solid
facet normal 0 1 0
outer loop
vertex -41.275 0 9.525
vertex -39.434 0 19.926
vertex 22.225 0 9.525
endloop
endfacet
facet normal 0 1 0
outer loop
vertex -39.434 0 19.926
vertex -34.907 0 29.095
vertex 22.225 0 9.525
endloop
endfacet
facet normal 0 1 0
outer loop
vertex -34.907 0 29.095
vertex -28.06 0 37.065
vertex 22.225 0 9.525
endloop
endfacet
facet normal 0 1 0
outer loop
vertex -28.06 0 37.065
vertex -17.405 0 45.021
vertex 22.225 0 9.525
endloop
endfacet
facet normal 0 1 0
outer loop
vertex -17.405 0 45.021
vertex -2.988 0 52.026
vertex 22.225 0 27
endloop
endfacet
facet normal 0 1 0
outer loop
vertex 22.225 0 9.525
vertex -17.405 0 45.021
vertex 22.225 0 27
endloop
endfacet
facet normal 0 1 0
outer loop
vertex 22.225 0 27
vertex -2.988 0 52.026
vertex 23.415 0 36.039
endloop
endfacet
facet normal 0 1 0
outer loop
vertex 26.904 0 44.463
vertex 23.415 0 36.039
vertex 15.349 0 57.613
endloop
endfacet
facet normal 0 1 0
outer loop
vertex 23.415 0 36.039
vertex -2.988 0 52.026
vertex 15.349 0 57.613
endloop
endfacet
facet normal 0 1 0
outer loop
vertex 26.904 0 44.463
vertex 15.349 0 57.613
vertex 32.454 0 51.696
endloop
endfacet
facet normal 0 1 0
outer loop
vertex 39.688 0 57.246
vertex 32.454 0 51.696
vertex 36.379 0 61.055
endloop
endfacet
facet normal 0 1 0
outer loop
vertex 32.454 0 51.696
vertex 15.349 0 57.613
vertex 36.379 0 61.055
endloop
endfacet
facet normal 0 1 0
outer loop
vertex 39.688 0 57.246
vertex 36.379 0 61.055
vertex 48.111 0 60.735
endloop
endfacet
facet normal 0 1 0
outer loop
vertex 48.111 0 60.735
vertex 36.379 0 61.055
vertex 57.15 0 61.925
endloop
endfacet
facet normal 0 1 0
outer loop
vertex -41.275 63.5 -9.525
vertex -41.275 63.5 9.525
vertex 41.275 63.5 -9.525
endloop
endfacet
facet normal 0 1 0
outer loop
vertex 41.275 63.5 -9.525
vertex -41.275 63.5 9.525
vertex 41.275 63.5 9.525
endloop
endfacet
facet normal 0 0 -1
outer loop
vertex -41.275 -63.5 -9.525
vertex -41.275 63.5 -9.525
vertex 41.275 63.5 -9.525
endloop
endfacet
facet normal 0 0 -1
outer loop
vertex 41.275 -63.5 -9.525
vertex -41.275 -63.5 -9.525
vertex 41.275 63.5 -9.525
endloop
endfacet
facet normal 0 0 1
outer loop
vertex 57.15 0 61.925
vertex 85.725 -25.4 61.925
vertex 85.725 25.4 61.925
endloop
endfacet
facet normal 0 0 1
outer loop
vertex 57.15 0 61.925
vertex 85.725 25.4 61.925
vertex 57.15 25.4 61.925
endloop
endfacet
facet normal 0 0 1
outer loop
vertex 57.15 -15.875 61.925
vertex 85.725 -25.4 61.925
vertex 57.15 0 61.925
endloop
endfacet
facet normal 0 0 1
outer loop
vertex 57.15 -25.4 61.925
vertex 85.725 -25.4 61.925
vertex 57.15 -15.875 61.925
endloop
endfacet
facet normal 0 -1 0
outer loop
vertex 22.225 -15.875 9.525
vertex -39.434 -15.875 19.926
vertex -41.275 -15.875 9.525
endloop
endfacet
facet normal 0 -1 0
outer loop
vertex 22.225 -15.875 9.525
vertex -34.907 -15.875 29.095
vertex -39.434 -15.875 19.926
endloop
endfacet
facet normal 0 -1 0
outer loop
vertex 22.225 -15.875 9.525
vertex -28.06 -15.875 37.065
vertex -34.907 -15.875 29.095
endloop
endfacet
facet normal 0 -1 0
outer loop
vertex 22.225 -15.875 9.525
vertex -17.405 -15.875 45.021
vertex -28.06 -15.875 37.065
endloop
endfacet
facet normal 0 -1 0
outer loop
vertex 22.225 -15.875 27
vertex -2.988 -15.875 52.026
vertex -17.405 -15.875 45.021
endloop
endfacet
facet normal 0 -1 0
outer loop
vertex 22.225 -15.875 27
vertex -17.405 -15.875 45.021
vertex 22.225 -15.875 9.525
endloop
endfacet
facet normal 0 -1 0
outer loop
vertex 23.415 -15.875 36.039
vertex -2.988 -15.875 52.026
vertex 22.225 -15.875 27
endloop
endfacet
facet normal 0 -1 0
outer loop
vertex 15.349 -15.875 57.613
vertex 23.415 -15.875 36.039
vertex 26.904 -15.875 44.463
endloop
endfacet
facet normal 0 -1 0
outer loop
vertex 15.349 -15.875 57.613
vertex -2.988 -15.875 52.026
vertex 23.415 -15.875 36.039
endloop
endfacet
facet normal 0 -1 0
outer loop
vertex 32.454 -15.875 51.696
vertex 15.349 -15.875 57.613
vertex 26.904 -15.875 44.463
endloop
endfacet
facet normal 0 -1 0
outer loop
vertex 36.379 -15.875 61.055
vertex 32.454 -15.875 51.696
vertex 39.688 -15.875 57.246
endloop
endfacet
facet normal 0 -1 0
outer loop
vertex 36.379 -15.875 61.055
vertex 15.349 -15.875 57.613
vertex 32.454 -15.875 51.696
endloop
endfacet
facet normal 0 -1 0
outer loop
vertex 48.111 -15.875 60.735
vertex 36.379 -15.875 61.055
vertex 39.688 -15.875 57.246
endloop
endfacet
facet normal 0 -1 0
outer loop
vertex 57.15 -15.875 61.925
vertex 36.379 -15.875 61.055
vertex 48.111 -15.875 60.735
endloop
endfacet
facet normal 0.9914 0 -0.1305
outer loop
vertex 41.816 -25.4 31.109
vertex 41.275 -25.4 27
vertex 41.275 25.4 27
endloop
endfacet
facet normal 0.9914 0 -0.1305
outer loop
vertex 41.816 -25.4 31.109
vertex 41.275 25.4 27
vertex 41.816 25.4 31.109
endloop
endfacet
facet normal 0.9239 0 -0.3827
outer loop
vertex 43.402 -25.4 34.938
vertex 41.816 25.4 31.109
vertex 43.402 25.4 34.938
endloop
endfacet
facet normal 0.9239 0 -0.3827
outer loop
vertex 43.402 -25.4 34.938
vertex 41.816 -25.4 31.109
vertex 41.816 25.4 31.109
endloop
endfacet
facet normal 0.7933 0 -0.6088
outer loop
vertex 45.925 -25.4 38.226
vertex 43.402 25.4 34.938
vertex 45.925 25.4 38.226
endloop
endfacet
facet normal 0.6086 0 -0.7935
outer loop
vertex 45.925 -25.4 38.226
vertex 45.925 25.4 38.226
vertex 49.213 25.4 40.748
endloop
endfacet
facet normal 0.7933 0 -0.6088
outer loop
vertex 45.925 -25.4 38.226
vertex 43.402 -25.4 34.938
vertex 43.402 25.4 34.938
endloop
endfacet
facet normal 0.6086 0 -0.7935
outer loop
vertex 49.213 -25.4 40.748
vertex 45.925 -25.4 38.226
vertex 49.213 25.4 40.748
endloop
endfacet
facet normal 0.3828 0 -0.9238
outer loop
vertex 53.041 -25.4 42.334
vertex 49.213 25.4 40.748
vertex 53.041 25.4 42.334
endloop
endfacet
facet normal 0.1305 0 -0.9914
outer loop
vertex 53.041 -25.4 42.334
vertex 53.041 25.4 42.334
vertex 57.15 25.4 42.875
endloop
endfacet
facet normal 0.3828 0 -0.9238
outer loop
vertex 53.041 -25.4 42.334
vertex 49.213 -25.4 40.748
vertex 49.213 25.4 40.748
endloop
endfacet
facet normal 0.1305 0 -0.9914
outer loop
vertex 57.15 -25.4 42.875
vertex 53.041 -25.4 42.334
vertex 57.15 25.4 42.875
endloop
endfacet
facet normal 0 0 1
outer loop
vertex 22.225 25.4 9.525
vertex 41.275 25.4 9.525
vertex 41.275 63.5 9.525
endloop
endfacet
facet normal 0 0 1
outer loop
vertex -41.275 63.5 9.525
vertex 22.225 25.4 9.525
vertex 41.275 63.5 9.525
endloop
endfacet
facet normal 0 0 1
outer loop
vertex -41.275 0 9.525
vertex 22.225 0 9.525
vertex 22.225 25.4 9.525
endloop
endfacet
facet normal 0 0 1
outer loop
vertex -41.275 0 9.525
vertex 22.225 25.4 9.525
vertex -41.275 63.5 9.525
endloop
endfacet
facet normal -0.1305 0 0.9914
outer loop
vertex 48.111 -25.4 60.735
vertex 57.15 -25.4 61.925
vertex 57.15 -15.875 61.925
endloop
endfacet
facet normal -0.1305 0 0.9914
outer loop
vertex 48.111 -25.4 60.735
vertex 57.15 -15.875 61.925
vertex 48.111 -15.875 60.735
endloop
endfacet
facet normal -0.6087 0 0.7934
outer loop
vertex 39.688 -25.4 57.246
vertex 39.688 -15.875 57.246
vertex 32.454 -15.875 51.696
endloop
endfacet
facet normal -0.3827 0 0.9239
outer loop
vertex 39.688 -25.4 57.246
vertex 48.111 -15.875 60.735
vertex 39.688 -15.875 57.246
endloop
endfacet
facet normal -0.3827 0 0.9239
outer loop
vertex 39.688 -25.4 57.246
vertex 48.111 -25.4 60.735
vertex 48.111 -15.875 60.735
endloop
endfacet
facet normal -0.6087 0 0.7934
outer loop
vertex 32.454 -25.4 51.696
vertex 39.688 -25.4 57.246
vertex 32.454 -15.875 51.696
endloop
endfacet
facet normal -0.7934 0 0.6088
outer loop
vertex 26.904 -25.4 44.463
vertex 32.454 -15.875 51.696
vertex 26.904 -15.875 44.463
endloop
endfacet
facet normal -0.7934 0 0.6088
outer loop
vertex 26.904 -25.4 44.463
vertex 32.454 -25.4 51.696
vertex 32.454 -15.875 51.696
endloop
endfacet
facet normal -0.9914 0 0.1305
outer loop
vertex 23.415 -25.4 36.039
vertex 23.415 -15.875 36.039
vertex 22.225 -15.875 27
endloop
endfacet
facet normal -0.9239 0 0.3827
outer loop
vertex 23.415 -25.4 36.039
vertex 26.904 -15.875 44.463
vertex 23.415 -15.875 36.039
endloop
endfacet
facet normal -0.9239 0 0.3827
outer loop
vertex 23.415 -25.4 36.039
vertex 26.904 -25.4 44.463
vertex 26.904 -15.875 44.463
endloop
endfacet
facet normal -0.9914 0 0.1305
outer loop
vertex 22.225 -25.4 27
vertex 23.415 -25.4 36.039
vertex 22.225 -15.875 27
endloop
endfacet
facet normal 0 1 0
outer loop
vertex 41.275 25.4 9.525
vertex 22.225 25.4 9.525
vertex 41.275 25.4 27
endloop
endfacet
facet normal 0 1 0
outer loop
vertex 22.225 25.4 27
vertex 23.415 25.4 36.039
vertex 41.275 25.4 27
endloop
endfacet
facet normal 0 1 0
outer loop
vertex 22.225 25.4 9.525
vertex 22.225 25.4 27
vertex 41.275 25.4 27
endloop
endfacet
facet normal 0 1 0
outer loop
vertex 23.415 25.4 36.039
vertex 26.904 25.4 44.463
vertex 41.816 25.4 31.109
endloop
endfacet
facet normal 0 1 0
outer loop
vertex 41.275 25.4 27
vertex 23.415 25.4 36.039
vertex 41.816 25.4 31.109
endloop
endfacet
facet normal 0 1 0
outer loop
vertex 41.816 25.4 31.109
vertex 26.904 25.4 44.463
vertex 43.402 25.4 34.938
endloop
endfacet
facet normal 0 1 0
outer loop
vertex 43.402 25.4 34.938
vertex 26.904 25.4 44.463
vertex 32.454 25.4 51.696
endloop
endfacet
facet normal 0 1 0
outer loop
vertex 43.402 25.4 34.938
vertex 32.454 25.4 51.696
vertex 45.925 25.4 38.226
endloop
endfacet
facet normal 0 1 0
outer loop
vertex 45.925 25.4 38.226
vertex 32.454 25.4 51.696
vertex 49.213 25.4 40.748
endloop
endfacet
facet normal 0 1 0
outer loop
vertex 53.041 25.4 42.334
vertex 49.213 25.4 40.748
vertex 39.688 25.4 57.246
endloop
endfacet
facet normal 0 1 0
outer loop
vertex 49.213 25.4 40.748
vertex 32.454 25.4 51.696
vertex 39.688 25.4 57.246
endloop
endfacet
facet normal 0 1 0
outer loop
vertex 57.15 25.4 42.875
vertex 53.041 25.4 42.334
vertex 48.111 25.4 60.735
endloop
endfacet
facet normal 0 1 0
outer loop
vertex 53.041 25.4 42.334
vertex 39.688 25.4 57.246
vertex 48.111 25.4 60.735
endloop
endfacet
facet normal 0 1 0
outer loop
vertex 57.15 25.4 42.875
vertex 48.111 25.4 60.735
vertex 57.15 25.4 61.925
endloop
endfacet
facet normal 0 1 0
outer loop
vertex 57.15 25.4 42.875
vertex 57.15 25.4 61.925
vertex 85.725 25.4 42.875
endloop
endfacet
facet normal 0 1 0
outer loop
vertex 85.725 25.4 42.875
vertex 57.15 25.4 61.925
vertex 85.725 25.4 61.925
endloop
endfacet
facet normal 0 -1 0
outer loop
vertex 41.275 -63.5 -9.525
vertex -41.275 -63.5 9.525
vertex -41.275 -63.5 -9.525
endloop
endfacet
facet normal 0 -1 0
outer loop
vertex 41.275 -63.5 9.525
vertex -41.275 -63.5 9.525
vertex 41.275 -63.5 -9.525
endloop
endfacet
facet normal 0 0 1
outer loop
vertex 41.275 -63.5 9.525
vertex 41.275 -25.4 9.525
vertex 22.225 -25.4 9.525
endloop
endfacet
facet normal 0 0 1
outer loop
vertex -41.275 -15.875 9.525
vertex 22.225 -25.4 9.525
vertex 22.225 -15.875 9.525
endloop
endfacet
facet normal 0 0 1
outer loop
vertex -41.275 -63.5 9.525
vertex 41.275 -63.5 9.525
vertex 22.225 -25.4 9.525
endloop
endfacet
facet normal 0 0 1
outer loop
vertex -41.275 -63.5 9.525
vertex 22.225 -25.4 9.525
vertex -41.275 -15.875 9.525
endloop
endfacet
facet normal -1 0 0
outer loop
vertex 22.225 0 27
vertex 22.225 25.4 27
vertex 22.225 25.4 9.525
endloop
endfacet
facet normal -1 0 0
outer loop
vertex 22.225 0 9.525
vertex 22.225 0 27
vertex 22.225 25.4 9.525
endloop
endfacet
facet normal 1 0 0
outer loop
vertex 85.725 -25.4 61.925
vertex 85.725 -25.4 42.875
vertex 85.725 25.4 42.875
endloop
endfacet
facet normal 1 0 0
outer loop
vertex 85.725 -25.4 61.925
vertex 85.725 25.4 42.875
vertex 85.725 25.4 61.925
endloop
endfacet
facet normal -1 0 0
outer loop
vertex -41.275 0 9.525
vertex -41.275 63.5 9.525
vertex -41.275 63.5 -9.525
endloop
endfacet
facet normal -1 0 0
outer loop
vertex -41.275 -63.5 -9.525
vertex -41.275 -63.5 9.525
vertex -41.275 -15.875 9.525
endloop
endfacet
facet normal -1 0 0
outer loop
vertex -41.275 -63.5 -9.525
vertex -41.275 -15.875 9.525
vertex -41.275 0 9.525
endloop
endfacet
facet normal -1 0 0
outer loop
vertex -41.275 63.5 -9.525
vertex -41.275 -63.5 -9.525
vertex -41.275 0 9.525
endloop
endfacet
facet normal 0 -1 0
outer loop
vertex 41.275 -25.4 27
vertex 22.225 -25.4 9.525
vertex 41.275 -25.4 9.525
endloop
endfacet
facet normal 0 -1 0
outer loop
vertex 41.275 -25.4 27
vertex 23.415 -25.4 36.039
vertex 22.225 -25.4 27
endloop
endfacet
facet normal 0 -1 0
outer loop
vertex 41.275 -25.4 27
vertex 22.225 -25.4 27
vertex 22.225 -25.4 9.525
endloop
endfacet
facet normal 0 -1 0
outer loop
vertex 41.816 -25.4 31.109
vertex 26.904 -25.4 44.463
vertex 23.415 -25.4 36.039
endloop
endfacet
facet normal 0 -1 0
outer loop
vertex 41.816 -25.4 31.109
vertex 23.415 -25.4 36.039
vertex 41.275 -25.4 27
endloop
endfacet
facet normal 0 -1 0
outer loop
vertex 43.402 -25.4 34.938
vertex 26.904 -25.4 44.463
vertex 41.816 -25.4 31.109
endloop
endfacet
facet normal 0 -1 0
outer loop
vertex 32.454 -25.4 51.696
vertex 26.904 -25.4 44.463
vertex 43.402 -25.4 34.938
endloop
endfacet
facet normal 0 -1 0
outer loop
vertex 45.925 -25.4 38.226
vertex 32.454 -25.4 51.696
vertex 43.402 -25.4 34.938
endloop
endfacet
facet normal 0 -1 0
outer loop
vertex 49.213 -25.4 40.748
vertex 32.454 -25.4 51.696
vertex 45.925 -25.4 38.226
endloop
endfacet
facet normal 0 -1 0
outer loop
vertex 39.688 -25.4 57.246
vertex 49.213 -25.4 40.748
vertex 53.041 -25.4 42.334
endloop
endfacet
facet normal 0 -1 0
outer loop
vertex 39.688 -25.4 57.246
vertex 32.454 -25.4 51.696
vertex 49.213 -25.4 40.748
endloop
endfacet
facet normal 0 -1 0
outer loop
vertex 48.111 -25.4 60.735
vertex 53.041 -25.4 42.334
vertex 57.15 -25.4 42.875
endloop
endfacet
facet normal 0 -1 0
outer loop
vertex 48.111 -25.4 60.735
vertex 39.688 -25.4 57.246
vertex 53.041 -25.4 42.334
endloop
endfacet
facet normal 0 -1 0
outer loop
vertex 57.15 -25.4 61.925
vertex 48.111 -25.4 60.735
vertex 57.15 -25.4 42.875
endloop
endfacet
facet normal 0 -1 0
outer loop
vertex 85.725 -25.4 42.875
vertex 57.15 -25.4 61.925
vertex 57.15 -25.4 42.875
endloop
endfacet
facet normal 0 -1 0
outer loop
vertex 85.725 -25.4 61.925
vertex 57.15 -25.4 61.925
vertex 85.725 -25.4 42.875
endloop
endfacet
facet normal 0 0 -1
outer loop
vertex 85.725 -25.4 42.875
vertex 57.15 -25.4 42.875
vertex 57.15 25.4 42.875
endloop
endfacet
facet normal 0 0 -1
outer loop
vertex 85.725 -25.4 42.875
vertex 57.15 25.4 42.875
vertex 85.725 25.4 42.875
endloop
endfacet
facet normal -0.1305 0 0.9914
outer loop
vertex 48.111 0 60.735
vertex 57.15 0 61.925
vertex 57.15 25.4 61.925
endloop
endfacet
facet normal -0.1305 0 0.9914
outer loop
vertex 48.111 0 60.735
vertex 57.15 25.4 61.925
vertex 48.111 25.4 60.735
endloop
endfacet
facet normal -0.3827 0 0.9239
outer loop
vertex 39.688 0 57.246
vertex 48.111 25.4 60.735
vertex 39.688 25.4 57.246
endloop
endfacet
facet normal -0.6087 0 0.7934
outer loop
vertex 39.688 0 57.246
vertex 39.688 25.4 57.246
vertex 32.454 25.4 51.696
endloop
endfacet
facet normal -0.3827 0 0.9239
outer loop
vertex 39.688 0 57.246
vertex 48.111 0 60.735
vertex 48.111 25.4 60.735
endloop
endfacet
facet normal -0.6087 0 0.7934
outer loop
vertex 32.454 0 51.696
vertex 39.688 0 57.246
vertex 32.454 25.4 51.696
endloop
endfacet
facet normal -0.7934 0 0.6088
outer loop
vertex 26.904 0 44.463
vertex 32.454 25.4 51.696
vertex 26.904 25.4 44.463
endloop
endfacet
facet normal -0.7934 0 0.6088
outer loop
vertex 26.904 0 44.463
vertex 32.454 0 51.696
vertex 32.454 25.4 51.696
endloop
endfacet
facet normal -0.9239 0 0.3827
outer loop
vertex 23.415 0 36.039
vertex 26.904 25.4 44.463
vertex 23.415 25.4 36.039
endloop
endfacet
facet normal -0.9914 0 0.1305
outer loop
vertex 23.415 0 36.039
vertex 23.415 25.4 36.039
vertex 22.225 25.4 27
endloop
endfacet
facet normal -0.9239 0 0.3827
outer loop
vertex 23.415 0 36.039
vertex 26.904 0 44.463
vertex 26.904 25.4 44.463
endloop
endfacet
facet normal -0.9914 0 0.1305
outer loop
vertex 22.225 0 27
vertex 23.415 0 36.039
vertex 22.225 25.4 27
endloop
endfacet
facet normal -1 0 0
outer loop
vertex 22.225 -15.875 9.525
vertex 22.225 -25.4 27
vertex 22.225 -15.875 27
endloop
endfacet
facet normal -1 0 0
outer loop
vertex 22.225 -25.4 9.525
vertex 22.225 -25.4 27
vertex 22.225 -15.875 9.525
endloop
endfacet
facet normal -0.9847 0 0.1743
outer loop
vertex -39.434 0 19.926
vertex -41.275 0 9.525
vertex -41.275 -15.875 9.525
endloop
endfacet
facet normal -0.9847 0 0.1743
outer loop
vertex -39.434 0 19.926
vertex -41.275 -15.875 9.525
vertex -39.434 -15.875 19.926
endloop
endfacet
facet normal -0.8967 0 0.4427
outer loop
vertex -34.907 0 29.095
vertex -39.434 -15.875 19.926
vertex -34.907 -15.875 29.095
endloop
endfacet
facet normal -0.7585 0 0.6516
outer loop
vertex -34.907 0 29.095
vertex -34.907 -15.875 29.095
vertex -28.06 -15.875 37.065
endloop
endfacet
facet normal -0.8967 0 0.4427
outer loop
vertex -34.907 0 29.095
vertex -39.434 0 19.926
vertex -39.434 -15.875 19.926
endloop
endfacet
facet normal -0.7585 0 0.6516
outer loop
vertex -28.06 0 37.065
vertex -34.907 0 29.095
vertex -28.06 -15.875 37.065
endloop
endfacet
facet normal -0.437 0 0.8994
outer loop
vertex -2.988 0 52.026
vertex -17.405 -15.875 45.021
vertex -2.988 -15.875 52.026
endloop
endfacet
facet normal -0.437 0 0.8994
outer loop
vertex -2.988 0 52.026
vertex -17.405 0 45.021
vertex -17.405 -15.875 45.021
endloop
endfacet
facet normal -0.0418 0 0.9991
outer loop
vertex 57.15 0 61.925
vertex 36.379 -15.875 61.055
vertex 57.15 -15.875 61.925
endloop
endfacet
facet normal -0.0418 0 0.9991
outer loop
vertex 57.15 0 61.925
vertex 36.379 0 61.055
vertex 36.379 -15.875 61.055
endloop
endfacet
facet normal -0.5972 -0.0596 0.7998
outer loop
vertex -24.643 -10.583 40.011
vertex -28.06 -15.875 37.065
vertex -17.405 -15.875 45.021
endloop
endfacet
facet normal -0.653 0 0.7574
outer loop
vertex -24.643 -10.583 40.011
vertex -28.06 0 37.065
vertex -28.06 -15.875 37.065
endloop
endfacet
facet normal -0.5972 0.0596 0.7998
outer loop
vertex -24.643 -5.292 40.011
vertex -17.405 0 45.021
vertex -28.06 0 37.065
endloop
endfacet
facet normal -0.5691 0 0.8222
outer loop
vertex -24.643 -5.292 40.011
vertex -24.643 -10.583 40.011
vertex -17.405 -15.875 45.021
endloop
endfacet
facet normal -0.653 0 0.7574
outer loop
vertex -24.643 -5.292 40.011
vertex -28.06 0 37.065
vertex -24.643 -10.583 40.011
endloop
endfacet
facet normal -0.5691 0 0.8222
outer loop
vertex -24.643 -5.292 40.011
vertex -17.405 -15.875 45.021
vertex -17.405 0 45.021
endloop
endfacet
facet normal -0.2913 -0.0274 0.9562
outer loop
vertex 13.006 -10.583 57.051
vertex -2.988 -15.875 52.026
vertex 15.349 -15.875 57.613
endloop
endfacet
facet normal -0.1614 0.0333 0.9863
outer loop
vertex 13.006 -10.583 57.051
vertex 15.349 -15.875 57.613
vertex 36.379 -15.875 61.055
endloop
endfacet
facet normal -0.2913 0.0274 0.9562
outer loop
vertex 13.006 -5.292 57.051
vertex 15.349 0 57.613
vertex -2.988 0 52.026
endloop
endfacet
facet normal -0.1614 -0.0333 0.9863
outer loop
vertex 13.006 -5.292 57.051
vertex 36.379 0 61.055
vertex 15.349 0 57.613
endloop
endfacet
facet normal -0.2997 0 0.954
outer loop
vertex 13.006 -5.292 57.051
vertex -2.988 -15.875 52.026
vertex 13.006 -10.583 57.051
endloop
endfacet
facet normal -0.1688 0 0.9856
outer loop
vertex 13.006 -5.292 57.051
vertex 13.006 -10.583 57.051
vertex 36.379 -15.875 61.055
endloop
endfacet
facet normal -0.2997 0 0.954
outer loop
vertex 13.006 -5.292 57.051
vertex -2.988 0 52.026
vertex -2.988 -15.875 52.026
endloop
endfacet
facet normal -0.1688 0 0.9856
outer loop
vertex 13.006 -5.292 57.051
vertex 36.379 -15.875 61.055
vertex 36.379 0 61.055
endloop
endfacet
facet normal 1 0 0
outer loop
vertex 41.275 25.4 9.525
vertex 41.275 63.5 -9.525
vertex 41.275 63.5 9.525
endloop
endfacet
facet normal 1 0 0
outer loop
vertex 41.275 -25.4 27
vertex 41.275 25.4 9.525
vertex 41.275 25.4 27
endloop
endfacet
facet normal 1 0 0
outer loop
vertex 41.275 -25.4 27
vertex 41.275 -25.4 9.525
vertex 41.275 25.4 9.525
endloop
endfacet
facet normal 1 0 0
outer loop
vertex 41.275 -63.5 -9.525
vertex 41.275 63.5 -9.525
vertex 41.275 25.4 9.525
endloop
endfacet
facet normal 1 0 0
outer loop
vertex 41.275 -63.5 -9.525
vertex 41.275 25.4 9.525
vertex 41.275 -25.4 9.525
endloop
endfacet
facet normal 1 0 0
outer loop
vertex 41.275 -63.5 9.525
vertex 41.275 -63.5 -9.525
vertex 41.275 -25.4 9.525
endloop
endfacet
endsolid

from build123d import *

# Parameters (mm, degrees)
F1_DEPTH = 63.5
F0_W     = 25.4
F0_H     = 19.05
F2_DEPTH = 25.4
F3_DEPTH = 15.875


with BuildPart() as f1:
    # F0 (on Front) → F1 (new body, symmetric)
    with BuildSketch(Plane.XZ):
        Polygon((41.275, -9.525), (41.275, 9.525), (22.225, 9.525), (-41.275, 9.525), (-41.275, -9.525), align=None)
    extrude(amount=F1_DEPTH, both=True)

    # F0 (on Front) → F2 (join, symmetric)
    with BuildSketch(Plane.XZ):
        with BuildLine():
            Line((22.225, 9.525), (41.275, 9.525))
            Line((41.275, 9.525), (41.275, 27.0002))
            ThreePointArc((41.275, 27.0002), (45.9246798487, 38.2255201513), (57.15, 42.8752))
            Line((57.15, 42.8752), (60.325, 42.8752))
            Line((60.325, 42.8752), (60.325, 61.9252))
            Line((60.325, 61.9252), (57.15, 61.9252))
            ThreePointArc((57.15, 61.9252), (32.4542956671, 51.6959043329), (22.225, 27.0002))
            Line((22.225, 27.0002), (22.225, 9.525))
        make_face()
        with Locations((73.025, 52.4002)):
            Rectangle(F0_W, F0_H)
    extrude(amount=F2_DEPTH, both=True)

    # F0 (on Front) → F3 (join)
    with BuildSketch(Plane.XZ):
        with BuildLine():
            Line((-41.275, 9.525), (22.225, 9.525))
            Line((22.225, 9.525), (22.225, 27.0002))
            ThreePointArc((22.225, 27.0002), (32.4542956671, 51.6959043329), (57.15, 61.9252))
            add(Edge.make_bspline(
                [(-41.275, 9.525), (-39.9924255908, 47.1598803997), (14.5989470184, 62.7080574632), (57.15, 61.9252)],
                knots=[0, 0, 0, 0, 111.5045361635, 111.5045361635, 111.5045361635, 111.5045361635], degree=3))
        make_face()
    extrude(amount=F3_DEPTH)


solid = f1.part
